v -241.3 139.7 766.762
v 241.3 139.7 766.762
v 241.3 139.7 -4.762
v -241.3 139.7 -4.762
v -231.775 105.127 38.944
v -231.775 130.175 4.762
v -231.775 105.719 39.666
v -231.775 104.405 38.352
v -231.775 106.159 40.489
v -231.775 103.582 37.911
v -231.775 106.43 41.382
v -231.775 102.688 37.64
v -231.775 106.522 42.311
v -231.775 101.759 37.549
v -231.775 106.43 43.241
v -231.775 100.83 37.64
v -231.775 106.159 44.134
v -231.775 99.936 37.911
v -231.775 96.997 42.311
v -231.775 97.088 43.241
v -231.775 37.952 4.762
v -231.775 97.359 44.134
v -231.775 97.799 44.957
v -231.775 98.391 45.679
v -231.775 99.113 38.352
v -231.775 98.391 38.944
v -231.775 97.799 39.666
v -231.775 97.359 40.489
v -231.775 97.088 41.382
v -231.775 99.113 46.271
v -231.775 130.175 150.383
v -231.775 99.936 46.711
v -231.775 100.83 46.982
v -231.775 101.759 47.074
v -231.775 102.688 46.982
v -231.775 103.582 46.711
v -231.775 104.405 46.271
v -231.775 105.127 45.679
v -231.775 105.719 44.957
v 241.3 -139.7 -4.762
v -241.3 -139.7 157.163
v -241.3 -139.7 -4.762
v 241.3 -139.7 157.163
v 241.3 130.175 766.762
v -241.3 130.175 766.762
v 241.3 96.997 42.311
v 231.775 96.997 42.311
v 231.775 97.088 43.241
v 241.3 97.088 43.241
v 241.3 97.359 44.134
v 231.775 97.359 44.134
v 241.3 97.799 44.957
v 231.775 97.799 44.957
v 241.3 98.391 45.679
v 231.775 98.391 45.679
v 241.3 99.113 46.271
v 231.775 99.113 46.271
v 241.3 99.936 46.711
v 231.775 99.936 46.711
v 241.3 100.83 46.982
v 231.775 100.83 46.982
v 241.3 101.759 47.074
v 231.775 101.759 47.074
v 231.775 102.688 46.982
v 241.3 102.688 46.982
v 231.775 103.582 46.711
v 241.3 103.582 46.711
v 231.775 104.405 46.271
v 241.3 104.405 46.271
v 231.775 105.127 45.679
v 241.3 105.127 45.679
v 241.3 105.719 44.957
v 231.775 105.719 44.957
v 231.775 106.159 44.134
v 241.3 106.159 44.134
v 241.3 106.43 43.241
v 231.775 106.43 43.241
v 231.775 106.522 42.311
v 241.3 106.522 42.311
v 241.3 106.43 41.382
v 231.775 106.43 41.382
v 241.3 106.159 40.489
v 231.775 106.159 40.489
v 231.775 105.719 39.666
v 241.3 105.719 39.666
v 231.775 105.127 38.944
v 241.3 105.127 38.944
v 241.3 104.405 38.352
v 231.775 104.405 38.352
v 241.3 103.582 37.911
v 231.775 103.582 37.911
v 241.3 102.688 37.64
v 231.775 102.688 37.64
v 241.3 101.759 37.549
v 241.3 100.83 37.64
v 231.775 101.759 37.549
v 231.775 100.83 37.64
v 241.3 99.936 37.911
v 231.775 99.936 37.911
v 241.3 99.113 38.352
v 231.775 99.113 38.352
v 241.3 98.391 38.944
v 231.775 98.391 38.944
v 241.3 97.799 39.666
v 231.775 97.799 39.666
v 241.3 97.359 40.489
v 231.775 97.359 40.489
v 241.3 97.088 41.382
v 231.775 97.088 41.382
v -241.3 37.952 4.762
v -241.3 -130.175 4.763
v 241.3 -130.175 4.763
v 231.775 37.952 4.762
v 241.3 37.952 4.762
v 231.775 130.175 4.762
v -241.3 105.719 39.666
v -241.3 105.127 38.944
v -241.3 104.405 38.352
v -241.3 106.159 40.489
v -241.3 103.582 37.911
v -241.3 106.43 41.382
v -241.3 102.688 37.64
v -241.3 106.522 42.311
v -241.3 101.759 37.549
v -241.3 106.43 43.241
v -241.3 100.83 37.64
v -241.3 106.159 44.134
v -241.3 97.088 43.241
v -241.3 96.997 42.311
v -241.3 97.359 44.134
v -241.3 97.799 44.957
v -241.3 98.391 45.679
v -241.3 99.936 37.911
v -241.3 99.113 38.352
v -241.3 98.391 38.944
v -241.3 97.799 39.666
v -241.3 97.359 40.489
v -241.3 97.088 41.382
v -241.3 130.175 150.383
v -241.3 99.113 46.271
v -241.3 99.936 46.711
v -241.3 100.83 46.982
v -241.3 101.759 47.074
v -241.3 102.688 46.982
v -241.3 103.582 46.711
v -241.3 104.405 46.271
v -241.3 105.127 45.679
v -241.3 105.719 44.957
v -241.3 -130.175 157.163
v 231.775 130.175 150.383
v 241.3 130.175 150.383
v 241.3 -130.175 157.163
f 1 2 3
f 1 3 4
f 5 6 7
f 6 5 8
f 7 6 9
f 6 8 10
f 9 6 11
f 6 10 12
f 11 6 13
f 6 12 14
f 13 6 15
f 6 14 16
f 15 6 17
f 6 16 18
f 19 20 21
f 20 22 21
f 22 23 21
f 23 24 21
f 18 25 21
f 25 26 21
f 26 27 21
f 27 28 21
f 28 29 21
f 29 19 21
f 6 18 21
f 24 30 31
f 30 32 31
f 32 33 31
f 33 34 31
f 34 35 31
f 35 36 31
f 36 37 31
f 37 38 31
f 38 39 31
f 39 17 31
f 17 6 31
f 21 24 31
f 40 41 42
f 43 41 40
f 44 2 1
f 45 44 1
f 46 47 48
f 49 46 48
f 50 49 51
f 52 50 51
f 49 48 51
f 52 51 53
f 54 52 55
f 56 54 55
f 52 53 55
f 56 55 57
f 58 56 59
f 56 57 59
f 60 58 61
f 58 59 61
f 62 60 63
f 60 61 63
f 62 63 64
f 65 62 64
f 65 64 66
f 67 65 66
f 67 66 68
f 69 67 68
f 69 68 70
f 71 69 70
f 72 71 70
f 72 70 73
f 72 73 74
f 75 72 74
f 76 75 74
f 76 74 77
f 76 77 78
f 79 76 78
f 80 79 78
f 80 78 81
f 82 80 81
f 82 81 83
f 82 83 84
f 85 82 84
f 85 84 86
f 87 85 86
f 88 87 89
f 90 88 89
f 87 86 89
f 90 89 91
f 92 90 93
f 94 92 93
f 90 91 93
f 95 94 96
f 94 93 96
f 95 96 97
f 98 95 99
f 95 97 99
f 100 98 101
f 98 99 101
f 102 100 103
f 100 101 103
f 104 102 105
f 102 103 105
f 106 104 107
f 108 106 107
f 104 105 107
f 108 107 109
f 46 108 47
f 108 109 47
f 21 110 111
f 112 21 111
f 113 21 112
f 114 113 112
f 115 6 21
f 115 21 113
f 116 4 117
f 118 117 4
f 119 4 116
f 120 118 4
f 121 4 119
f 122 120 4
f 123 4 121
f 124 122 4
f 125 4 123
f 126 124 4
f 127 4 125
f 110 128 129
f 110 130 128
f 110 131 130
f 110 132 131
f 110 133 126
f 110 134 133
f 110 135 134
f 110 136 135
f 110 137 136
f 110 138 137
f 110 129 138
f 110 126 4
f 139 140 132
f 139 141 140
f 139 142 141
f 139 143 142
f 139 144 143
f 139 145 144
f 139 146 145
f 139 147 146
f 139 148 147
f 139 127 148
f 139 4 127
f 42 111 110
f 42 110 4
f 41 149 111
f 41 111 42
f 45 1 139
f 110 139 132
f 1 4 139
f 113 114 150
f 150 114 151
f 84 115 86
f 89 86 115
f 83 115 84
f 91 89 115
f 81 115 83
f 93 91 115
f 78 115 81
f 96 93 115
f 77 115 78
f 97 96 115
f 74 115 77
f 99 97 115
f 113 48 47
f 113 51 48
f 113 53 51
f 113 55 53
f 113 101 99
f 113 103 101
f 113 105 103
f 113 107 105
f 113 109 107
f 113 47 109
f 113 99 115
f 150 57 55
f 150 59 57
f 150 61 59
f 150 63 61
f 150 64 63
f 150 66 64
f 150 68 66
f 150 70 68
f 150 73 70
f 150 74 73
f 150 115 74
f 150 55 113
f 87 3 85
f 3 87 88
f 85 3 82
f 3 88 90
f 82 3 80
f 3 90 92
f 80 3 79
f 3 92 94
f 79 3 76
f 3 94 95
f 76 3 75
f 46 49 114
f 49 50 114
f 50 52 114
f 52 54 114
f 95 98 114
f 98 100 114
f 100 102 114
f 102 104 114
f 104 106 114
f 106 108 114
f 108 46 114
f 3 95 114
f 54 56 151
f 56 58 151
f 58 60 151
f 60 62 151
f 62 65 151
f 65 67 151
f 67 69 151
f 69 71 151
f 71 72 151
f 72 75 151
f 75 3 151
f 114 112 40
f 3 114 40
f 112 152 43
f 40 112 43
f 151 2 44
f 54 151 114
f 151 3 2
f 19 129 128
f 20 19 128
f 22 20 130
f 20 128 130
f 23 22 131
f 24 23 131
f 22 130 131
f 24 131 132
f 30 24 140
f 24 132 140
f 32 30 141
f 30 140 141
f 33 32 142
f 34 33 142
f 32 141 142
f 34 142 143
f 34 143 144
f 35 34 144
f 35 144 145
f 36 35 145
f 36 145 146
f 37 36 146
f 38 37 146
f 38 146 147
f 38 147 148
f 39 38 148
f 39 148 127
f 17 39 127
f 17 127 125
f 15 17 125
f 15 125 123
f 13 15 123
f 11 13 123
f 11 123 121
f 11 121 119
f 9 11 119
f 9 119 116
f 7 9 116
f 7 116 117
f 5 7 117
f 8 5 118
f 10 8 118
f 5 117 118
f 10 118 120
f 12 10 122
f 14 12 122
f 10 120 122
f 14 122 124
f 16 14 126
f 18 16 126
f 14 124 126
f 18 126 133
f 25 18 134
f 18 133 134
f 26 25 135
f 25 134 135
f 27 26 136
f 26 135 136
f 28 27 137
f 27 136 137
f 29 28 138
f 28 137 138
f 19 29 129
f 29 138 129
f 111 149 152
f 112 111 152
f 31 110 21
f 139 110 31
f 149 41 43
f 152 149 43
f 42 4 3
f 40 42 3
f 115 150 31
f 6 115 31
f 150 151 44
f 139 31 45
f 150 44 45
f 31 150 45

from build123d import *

# Parameters (mm, degrees)
F0_W     = 482.6
F0_H     = 279.4
F1_DEPTH = 4.7625
F2_W     = 482.6
F2_H     = 762
F3_DEPTH = 9.525
F4_W     = 482.6
F4_H     = 152.4
F5_DEPTH = 9.525
F7_DEPTH = 9.525
F9_D     = 9.525


# Not quite as in the source:
# - a pattern or mirror of a feature is missing from the dataset's text; its kind, count and spacing are read off the source's solid


with BuildPart() as f1:
    # F0 (on Top) → F1 (new body, symmetric)
    with BuildSketch(Plane.XY):
        Rectangle(F0_W, F0_H)
    extrude(amount=F1_DEPTH, both=True)

    # F2 (on face) → F3 (join)
    with BuildSketch(Plane(origin=(0, 139.7, 0), x_dir=(-1, 0, 0), z_dir=(0, 1, 0))):
        with Locations((0, 385.7625)):
            Rectangle(F2_W, F2_H)
    extrude(amount=-F3_DEPTH)

    # F4 (on face) → F5 (join)
    with BuildSketch(Plane.XZ.offset(139.7)):
        with Locations((0, 80.9625)):
            Rectangle(F4_W, F4_H)
    extrude(amount=-F5_DEPTH)

    # F6 (on face) → F7 (join)
    with BuildSketch(Plane(origin=(-241.3, 0, 0), x_dir=(0, -1, 0), z_dir=(-1, 0, 0))):
        Polygon((-37.9520058632, 4.7625), (-130.175, 150.3834724426), (-130.175, 4.7625), align=None)
    f7 = extrude(amount=-F7_DEPTH)

    # F7_copies: F7 across plane
    add(f7.mirror(Plane(origin=(0, 0, 0), x_dir=(0, 0, 1), z_dir=(1, 0, 0))))

    # F9 (through all)
    with Locations(Plane.YZ.offset(241.3)):
        with Locations((101.7590165138, 42.3114337027)):
            Hole(F9_D / 2)


solid = f1.part
